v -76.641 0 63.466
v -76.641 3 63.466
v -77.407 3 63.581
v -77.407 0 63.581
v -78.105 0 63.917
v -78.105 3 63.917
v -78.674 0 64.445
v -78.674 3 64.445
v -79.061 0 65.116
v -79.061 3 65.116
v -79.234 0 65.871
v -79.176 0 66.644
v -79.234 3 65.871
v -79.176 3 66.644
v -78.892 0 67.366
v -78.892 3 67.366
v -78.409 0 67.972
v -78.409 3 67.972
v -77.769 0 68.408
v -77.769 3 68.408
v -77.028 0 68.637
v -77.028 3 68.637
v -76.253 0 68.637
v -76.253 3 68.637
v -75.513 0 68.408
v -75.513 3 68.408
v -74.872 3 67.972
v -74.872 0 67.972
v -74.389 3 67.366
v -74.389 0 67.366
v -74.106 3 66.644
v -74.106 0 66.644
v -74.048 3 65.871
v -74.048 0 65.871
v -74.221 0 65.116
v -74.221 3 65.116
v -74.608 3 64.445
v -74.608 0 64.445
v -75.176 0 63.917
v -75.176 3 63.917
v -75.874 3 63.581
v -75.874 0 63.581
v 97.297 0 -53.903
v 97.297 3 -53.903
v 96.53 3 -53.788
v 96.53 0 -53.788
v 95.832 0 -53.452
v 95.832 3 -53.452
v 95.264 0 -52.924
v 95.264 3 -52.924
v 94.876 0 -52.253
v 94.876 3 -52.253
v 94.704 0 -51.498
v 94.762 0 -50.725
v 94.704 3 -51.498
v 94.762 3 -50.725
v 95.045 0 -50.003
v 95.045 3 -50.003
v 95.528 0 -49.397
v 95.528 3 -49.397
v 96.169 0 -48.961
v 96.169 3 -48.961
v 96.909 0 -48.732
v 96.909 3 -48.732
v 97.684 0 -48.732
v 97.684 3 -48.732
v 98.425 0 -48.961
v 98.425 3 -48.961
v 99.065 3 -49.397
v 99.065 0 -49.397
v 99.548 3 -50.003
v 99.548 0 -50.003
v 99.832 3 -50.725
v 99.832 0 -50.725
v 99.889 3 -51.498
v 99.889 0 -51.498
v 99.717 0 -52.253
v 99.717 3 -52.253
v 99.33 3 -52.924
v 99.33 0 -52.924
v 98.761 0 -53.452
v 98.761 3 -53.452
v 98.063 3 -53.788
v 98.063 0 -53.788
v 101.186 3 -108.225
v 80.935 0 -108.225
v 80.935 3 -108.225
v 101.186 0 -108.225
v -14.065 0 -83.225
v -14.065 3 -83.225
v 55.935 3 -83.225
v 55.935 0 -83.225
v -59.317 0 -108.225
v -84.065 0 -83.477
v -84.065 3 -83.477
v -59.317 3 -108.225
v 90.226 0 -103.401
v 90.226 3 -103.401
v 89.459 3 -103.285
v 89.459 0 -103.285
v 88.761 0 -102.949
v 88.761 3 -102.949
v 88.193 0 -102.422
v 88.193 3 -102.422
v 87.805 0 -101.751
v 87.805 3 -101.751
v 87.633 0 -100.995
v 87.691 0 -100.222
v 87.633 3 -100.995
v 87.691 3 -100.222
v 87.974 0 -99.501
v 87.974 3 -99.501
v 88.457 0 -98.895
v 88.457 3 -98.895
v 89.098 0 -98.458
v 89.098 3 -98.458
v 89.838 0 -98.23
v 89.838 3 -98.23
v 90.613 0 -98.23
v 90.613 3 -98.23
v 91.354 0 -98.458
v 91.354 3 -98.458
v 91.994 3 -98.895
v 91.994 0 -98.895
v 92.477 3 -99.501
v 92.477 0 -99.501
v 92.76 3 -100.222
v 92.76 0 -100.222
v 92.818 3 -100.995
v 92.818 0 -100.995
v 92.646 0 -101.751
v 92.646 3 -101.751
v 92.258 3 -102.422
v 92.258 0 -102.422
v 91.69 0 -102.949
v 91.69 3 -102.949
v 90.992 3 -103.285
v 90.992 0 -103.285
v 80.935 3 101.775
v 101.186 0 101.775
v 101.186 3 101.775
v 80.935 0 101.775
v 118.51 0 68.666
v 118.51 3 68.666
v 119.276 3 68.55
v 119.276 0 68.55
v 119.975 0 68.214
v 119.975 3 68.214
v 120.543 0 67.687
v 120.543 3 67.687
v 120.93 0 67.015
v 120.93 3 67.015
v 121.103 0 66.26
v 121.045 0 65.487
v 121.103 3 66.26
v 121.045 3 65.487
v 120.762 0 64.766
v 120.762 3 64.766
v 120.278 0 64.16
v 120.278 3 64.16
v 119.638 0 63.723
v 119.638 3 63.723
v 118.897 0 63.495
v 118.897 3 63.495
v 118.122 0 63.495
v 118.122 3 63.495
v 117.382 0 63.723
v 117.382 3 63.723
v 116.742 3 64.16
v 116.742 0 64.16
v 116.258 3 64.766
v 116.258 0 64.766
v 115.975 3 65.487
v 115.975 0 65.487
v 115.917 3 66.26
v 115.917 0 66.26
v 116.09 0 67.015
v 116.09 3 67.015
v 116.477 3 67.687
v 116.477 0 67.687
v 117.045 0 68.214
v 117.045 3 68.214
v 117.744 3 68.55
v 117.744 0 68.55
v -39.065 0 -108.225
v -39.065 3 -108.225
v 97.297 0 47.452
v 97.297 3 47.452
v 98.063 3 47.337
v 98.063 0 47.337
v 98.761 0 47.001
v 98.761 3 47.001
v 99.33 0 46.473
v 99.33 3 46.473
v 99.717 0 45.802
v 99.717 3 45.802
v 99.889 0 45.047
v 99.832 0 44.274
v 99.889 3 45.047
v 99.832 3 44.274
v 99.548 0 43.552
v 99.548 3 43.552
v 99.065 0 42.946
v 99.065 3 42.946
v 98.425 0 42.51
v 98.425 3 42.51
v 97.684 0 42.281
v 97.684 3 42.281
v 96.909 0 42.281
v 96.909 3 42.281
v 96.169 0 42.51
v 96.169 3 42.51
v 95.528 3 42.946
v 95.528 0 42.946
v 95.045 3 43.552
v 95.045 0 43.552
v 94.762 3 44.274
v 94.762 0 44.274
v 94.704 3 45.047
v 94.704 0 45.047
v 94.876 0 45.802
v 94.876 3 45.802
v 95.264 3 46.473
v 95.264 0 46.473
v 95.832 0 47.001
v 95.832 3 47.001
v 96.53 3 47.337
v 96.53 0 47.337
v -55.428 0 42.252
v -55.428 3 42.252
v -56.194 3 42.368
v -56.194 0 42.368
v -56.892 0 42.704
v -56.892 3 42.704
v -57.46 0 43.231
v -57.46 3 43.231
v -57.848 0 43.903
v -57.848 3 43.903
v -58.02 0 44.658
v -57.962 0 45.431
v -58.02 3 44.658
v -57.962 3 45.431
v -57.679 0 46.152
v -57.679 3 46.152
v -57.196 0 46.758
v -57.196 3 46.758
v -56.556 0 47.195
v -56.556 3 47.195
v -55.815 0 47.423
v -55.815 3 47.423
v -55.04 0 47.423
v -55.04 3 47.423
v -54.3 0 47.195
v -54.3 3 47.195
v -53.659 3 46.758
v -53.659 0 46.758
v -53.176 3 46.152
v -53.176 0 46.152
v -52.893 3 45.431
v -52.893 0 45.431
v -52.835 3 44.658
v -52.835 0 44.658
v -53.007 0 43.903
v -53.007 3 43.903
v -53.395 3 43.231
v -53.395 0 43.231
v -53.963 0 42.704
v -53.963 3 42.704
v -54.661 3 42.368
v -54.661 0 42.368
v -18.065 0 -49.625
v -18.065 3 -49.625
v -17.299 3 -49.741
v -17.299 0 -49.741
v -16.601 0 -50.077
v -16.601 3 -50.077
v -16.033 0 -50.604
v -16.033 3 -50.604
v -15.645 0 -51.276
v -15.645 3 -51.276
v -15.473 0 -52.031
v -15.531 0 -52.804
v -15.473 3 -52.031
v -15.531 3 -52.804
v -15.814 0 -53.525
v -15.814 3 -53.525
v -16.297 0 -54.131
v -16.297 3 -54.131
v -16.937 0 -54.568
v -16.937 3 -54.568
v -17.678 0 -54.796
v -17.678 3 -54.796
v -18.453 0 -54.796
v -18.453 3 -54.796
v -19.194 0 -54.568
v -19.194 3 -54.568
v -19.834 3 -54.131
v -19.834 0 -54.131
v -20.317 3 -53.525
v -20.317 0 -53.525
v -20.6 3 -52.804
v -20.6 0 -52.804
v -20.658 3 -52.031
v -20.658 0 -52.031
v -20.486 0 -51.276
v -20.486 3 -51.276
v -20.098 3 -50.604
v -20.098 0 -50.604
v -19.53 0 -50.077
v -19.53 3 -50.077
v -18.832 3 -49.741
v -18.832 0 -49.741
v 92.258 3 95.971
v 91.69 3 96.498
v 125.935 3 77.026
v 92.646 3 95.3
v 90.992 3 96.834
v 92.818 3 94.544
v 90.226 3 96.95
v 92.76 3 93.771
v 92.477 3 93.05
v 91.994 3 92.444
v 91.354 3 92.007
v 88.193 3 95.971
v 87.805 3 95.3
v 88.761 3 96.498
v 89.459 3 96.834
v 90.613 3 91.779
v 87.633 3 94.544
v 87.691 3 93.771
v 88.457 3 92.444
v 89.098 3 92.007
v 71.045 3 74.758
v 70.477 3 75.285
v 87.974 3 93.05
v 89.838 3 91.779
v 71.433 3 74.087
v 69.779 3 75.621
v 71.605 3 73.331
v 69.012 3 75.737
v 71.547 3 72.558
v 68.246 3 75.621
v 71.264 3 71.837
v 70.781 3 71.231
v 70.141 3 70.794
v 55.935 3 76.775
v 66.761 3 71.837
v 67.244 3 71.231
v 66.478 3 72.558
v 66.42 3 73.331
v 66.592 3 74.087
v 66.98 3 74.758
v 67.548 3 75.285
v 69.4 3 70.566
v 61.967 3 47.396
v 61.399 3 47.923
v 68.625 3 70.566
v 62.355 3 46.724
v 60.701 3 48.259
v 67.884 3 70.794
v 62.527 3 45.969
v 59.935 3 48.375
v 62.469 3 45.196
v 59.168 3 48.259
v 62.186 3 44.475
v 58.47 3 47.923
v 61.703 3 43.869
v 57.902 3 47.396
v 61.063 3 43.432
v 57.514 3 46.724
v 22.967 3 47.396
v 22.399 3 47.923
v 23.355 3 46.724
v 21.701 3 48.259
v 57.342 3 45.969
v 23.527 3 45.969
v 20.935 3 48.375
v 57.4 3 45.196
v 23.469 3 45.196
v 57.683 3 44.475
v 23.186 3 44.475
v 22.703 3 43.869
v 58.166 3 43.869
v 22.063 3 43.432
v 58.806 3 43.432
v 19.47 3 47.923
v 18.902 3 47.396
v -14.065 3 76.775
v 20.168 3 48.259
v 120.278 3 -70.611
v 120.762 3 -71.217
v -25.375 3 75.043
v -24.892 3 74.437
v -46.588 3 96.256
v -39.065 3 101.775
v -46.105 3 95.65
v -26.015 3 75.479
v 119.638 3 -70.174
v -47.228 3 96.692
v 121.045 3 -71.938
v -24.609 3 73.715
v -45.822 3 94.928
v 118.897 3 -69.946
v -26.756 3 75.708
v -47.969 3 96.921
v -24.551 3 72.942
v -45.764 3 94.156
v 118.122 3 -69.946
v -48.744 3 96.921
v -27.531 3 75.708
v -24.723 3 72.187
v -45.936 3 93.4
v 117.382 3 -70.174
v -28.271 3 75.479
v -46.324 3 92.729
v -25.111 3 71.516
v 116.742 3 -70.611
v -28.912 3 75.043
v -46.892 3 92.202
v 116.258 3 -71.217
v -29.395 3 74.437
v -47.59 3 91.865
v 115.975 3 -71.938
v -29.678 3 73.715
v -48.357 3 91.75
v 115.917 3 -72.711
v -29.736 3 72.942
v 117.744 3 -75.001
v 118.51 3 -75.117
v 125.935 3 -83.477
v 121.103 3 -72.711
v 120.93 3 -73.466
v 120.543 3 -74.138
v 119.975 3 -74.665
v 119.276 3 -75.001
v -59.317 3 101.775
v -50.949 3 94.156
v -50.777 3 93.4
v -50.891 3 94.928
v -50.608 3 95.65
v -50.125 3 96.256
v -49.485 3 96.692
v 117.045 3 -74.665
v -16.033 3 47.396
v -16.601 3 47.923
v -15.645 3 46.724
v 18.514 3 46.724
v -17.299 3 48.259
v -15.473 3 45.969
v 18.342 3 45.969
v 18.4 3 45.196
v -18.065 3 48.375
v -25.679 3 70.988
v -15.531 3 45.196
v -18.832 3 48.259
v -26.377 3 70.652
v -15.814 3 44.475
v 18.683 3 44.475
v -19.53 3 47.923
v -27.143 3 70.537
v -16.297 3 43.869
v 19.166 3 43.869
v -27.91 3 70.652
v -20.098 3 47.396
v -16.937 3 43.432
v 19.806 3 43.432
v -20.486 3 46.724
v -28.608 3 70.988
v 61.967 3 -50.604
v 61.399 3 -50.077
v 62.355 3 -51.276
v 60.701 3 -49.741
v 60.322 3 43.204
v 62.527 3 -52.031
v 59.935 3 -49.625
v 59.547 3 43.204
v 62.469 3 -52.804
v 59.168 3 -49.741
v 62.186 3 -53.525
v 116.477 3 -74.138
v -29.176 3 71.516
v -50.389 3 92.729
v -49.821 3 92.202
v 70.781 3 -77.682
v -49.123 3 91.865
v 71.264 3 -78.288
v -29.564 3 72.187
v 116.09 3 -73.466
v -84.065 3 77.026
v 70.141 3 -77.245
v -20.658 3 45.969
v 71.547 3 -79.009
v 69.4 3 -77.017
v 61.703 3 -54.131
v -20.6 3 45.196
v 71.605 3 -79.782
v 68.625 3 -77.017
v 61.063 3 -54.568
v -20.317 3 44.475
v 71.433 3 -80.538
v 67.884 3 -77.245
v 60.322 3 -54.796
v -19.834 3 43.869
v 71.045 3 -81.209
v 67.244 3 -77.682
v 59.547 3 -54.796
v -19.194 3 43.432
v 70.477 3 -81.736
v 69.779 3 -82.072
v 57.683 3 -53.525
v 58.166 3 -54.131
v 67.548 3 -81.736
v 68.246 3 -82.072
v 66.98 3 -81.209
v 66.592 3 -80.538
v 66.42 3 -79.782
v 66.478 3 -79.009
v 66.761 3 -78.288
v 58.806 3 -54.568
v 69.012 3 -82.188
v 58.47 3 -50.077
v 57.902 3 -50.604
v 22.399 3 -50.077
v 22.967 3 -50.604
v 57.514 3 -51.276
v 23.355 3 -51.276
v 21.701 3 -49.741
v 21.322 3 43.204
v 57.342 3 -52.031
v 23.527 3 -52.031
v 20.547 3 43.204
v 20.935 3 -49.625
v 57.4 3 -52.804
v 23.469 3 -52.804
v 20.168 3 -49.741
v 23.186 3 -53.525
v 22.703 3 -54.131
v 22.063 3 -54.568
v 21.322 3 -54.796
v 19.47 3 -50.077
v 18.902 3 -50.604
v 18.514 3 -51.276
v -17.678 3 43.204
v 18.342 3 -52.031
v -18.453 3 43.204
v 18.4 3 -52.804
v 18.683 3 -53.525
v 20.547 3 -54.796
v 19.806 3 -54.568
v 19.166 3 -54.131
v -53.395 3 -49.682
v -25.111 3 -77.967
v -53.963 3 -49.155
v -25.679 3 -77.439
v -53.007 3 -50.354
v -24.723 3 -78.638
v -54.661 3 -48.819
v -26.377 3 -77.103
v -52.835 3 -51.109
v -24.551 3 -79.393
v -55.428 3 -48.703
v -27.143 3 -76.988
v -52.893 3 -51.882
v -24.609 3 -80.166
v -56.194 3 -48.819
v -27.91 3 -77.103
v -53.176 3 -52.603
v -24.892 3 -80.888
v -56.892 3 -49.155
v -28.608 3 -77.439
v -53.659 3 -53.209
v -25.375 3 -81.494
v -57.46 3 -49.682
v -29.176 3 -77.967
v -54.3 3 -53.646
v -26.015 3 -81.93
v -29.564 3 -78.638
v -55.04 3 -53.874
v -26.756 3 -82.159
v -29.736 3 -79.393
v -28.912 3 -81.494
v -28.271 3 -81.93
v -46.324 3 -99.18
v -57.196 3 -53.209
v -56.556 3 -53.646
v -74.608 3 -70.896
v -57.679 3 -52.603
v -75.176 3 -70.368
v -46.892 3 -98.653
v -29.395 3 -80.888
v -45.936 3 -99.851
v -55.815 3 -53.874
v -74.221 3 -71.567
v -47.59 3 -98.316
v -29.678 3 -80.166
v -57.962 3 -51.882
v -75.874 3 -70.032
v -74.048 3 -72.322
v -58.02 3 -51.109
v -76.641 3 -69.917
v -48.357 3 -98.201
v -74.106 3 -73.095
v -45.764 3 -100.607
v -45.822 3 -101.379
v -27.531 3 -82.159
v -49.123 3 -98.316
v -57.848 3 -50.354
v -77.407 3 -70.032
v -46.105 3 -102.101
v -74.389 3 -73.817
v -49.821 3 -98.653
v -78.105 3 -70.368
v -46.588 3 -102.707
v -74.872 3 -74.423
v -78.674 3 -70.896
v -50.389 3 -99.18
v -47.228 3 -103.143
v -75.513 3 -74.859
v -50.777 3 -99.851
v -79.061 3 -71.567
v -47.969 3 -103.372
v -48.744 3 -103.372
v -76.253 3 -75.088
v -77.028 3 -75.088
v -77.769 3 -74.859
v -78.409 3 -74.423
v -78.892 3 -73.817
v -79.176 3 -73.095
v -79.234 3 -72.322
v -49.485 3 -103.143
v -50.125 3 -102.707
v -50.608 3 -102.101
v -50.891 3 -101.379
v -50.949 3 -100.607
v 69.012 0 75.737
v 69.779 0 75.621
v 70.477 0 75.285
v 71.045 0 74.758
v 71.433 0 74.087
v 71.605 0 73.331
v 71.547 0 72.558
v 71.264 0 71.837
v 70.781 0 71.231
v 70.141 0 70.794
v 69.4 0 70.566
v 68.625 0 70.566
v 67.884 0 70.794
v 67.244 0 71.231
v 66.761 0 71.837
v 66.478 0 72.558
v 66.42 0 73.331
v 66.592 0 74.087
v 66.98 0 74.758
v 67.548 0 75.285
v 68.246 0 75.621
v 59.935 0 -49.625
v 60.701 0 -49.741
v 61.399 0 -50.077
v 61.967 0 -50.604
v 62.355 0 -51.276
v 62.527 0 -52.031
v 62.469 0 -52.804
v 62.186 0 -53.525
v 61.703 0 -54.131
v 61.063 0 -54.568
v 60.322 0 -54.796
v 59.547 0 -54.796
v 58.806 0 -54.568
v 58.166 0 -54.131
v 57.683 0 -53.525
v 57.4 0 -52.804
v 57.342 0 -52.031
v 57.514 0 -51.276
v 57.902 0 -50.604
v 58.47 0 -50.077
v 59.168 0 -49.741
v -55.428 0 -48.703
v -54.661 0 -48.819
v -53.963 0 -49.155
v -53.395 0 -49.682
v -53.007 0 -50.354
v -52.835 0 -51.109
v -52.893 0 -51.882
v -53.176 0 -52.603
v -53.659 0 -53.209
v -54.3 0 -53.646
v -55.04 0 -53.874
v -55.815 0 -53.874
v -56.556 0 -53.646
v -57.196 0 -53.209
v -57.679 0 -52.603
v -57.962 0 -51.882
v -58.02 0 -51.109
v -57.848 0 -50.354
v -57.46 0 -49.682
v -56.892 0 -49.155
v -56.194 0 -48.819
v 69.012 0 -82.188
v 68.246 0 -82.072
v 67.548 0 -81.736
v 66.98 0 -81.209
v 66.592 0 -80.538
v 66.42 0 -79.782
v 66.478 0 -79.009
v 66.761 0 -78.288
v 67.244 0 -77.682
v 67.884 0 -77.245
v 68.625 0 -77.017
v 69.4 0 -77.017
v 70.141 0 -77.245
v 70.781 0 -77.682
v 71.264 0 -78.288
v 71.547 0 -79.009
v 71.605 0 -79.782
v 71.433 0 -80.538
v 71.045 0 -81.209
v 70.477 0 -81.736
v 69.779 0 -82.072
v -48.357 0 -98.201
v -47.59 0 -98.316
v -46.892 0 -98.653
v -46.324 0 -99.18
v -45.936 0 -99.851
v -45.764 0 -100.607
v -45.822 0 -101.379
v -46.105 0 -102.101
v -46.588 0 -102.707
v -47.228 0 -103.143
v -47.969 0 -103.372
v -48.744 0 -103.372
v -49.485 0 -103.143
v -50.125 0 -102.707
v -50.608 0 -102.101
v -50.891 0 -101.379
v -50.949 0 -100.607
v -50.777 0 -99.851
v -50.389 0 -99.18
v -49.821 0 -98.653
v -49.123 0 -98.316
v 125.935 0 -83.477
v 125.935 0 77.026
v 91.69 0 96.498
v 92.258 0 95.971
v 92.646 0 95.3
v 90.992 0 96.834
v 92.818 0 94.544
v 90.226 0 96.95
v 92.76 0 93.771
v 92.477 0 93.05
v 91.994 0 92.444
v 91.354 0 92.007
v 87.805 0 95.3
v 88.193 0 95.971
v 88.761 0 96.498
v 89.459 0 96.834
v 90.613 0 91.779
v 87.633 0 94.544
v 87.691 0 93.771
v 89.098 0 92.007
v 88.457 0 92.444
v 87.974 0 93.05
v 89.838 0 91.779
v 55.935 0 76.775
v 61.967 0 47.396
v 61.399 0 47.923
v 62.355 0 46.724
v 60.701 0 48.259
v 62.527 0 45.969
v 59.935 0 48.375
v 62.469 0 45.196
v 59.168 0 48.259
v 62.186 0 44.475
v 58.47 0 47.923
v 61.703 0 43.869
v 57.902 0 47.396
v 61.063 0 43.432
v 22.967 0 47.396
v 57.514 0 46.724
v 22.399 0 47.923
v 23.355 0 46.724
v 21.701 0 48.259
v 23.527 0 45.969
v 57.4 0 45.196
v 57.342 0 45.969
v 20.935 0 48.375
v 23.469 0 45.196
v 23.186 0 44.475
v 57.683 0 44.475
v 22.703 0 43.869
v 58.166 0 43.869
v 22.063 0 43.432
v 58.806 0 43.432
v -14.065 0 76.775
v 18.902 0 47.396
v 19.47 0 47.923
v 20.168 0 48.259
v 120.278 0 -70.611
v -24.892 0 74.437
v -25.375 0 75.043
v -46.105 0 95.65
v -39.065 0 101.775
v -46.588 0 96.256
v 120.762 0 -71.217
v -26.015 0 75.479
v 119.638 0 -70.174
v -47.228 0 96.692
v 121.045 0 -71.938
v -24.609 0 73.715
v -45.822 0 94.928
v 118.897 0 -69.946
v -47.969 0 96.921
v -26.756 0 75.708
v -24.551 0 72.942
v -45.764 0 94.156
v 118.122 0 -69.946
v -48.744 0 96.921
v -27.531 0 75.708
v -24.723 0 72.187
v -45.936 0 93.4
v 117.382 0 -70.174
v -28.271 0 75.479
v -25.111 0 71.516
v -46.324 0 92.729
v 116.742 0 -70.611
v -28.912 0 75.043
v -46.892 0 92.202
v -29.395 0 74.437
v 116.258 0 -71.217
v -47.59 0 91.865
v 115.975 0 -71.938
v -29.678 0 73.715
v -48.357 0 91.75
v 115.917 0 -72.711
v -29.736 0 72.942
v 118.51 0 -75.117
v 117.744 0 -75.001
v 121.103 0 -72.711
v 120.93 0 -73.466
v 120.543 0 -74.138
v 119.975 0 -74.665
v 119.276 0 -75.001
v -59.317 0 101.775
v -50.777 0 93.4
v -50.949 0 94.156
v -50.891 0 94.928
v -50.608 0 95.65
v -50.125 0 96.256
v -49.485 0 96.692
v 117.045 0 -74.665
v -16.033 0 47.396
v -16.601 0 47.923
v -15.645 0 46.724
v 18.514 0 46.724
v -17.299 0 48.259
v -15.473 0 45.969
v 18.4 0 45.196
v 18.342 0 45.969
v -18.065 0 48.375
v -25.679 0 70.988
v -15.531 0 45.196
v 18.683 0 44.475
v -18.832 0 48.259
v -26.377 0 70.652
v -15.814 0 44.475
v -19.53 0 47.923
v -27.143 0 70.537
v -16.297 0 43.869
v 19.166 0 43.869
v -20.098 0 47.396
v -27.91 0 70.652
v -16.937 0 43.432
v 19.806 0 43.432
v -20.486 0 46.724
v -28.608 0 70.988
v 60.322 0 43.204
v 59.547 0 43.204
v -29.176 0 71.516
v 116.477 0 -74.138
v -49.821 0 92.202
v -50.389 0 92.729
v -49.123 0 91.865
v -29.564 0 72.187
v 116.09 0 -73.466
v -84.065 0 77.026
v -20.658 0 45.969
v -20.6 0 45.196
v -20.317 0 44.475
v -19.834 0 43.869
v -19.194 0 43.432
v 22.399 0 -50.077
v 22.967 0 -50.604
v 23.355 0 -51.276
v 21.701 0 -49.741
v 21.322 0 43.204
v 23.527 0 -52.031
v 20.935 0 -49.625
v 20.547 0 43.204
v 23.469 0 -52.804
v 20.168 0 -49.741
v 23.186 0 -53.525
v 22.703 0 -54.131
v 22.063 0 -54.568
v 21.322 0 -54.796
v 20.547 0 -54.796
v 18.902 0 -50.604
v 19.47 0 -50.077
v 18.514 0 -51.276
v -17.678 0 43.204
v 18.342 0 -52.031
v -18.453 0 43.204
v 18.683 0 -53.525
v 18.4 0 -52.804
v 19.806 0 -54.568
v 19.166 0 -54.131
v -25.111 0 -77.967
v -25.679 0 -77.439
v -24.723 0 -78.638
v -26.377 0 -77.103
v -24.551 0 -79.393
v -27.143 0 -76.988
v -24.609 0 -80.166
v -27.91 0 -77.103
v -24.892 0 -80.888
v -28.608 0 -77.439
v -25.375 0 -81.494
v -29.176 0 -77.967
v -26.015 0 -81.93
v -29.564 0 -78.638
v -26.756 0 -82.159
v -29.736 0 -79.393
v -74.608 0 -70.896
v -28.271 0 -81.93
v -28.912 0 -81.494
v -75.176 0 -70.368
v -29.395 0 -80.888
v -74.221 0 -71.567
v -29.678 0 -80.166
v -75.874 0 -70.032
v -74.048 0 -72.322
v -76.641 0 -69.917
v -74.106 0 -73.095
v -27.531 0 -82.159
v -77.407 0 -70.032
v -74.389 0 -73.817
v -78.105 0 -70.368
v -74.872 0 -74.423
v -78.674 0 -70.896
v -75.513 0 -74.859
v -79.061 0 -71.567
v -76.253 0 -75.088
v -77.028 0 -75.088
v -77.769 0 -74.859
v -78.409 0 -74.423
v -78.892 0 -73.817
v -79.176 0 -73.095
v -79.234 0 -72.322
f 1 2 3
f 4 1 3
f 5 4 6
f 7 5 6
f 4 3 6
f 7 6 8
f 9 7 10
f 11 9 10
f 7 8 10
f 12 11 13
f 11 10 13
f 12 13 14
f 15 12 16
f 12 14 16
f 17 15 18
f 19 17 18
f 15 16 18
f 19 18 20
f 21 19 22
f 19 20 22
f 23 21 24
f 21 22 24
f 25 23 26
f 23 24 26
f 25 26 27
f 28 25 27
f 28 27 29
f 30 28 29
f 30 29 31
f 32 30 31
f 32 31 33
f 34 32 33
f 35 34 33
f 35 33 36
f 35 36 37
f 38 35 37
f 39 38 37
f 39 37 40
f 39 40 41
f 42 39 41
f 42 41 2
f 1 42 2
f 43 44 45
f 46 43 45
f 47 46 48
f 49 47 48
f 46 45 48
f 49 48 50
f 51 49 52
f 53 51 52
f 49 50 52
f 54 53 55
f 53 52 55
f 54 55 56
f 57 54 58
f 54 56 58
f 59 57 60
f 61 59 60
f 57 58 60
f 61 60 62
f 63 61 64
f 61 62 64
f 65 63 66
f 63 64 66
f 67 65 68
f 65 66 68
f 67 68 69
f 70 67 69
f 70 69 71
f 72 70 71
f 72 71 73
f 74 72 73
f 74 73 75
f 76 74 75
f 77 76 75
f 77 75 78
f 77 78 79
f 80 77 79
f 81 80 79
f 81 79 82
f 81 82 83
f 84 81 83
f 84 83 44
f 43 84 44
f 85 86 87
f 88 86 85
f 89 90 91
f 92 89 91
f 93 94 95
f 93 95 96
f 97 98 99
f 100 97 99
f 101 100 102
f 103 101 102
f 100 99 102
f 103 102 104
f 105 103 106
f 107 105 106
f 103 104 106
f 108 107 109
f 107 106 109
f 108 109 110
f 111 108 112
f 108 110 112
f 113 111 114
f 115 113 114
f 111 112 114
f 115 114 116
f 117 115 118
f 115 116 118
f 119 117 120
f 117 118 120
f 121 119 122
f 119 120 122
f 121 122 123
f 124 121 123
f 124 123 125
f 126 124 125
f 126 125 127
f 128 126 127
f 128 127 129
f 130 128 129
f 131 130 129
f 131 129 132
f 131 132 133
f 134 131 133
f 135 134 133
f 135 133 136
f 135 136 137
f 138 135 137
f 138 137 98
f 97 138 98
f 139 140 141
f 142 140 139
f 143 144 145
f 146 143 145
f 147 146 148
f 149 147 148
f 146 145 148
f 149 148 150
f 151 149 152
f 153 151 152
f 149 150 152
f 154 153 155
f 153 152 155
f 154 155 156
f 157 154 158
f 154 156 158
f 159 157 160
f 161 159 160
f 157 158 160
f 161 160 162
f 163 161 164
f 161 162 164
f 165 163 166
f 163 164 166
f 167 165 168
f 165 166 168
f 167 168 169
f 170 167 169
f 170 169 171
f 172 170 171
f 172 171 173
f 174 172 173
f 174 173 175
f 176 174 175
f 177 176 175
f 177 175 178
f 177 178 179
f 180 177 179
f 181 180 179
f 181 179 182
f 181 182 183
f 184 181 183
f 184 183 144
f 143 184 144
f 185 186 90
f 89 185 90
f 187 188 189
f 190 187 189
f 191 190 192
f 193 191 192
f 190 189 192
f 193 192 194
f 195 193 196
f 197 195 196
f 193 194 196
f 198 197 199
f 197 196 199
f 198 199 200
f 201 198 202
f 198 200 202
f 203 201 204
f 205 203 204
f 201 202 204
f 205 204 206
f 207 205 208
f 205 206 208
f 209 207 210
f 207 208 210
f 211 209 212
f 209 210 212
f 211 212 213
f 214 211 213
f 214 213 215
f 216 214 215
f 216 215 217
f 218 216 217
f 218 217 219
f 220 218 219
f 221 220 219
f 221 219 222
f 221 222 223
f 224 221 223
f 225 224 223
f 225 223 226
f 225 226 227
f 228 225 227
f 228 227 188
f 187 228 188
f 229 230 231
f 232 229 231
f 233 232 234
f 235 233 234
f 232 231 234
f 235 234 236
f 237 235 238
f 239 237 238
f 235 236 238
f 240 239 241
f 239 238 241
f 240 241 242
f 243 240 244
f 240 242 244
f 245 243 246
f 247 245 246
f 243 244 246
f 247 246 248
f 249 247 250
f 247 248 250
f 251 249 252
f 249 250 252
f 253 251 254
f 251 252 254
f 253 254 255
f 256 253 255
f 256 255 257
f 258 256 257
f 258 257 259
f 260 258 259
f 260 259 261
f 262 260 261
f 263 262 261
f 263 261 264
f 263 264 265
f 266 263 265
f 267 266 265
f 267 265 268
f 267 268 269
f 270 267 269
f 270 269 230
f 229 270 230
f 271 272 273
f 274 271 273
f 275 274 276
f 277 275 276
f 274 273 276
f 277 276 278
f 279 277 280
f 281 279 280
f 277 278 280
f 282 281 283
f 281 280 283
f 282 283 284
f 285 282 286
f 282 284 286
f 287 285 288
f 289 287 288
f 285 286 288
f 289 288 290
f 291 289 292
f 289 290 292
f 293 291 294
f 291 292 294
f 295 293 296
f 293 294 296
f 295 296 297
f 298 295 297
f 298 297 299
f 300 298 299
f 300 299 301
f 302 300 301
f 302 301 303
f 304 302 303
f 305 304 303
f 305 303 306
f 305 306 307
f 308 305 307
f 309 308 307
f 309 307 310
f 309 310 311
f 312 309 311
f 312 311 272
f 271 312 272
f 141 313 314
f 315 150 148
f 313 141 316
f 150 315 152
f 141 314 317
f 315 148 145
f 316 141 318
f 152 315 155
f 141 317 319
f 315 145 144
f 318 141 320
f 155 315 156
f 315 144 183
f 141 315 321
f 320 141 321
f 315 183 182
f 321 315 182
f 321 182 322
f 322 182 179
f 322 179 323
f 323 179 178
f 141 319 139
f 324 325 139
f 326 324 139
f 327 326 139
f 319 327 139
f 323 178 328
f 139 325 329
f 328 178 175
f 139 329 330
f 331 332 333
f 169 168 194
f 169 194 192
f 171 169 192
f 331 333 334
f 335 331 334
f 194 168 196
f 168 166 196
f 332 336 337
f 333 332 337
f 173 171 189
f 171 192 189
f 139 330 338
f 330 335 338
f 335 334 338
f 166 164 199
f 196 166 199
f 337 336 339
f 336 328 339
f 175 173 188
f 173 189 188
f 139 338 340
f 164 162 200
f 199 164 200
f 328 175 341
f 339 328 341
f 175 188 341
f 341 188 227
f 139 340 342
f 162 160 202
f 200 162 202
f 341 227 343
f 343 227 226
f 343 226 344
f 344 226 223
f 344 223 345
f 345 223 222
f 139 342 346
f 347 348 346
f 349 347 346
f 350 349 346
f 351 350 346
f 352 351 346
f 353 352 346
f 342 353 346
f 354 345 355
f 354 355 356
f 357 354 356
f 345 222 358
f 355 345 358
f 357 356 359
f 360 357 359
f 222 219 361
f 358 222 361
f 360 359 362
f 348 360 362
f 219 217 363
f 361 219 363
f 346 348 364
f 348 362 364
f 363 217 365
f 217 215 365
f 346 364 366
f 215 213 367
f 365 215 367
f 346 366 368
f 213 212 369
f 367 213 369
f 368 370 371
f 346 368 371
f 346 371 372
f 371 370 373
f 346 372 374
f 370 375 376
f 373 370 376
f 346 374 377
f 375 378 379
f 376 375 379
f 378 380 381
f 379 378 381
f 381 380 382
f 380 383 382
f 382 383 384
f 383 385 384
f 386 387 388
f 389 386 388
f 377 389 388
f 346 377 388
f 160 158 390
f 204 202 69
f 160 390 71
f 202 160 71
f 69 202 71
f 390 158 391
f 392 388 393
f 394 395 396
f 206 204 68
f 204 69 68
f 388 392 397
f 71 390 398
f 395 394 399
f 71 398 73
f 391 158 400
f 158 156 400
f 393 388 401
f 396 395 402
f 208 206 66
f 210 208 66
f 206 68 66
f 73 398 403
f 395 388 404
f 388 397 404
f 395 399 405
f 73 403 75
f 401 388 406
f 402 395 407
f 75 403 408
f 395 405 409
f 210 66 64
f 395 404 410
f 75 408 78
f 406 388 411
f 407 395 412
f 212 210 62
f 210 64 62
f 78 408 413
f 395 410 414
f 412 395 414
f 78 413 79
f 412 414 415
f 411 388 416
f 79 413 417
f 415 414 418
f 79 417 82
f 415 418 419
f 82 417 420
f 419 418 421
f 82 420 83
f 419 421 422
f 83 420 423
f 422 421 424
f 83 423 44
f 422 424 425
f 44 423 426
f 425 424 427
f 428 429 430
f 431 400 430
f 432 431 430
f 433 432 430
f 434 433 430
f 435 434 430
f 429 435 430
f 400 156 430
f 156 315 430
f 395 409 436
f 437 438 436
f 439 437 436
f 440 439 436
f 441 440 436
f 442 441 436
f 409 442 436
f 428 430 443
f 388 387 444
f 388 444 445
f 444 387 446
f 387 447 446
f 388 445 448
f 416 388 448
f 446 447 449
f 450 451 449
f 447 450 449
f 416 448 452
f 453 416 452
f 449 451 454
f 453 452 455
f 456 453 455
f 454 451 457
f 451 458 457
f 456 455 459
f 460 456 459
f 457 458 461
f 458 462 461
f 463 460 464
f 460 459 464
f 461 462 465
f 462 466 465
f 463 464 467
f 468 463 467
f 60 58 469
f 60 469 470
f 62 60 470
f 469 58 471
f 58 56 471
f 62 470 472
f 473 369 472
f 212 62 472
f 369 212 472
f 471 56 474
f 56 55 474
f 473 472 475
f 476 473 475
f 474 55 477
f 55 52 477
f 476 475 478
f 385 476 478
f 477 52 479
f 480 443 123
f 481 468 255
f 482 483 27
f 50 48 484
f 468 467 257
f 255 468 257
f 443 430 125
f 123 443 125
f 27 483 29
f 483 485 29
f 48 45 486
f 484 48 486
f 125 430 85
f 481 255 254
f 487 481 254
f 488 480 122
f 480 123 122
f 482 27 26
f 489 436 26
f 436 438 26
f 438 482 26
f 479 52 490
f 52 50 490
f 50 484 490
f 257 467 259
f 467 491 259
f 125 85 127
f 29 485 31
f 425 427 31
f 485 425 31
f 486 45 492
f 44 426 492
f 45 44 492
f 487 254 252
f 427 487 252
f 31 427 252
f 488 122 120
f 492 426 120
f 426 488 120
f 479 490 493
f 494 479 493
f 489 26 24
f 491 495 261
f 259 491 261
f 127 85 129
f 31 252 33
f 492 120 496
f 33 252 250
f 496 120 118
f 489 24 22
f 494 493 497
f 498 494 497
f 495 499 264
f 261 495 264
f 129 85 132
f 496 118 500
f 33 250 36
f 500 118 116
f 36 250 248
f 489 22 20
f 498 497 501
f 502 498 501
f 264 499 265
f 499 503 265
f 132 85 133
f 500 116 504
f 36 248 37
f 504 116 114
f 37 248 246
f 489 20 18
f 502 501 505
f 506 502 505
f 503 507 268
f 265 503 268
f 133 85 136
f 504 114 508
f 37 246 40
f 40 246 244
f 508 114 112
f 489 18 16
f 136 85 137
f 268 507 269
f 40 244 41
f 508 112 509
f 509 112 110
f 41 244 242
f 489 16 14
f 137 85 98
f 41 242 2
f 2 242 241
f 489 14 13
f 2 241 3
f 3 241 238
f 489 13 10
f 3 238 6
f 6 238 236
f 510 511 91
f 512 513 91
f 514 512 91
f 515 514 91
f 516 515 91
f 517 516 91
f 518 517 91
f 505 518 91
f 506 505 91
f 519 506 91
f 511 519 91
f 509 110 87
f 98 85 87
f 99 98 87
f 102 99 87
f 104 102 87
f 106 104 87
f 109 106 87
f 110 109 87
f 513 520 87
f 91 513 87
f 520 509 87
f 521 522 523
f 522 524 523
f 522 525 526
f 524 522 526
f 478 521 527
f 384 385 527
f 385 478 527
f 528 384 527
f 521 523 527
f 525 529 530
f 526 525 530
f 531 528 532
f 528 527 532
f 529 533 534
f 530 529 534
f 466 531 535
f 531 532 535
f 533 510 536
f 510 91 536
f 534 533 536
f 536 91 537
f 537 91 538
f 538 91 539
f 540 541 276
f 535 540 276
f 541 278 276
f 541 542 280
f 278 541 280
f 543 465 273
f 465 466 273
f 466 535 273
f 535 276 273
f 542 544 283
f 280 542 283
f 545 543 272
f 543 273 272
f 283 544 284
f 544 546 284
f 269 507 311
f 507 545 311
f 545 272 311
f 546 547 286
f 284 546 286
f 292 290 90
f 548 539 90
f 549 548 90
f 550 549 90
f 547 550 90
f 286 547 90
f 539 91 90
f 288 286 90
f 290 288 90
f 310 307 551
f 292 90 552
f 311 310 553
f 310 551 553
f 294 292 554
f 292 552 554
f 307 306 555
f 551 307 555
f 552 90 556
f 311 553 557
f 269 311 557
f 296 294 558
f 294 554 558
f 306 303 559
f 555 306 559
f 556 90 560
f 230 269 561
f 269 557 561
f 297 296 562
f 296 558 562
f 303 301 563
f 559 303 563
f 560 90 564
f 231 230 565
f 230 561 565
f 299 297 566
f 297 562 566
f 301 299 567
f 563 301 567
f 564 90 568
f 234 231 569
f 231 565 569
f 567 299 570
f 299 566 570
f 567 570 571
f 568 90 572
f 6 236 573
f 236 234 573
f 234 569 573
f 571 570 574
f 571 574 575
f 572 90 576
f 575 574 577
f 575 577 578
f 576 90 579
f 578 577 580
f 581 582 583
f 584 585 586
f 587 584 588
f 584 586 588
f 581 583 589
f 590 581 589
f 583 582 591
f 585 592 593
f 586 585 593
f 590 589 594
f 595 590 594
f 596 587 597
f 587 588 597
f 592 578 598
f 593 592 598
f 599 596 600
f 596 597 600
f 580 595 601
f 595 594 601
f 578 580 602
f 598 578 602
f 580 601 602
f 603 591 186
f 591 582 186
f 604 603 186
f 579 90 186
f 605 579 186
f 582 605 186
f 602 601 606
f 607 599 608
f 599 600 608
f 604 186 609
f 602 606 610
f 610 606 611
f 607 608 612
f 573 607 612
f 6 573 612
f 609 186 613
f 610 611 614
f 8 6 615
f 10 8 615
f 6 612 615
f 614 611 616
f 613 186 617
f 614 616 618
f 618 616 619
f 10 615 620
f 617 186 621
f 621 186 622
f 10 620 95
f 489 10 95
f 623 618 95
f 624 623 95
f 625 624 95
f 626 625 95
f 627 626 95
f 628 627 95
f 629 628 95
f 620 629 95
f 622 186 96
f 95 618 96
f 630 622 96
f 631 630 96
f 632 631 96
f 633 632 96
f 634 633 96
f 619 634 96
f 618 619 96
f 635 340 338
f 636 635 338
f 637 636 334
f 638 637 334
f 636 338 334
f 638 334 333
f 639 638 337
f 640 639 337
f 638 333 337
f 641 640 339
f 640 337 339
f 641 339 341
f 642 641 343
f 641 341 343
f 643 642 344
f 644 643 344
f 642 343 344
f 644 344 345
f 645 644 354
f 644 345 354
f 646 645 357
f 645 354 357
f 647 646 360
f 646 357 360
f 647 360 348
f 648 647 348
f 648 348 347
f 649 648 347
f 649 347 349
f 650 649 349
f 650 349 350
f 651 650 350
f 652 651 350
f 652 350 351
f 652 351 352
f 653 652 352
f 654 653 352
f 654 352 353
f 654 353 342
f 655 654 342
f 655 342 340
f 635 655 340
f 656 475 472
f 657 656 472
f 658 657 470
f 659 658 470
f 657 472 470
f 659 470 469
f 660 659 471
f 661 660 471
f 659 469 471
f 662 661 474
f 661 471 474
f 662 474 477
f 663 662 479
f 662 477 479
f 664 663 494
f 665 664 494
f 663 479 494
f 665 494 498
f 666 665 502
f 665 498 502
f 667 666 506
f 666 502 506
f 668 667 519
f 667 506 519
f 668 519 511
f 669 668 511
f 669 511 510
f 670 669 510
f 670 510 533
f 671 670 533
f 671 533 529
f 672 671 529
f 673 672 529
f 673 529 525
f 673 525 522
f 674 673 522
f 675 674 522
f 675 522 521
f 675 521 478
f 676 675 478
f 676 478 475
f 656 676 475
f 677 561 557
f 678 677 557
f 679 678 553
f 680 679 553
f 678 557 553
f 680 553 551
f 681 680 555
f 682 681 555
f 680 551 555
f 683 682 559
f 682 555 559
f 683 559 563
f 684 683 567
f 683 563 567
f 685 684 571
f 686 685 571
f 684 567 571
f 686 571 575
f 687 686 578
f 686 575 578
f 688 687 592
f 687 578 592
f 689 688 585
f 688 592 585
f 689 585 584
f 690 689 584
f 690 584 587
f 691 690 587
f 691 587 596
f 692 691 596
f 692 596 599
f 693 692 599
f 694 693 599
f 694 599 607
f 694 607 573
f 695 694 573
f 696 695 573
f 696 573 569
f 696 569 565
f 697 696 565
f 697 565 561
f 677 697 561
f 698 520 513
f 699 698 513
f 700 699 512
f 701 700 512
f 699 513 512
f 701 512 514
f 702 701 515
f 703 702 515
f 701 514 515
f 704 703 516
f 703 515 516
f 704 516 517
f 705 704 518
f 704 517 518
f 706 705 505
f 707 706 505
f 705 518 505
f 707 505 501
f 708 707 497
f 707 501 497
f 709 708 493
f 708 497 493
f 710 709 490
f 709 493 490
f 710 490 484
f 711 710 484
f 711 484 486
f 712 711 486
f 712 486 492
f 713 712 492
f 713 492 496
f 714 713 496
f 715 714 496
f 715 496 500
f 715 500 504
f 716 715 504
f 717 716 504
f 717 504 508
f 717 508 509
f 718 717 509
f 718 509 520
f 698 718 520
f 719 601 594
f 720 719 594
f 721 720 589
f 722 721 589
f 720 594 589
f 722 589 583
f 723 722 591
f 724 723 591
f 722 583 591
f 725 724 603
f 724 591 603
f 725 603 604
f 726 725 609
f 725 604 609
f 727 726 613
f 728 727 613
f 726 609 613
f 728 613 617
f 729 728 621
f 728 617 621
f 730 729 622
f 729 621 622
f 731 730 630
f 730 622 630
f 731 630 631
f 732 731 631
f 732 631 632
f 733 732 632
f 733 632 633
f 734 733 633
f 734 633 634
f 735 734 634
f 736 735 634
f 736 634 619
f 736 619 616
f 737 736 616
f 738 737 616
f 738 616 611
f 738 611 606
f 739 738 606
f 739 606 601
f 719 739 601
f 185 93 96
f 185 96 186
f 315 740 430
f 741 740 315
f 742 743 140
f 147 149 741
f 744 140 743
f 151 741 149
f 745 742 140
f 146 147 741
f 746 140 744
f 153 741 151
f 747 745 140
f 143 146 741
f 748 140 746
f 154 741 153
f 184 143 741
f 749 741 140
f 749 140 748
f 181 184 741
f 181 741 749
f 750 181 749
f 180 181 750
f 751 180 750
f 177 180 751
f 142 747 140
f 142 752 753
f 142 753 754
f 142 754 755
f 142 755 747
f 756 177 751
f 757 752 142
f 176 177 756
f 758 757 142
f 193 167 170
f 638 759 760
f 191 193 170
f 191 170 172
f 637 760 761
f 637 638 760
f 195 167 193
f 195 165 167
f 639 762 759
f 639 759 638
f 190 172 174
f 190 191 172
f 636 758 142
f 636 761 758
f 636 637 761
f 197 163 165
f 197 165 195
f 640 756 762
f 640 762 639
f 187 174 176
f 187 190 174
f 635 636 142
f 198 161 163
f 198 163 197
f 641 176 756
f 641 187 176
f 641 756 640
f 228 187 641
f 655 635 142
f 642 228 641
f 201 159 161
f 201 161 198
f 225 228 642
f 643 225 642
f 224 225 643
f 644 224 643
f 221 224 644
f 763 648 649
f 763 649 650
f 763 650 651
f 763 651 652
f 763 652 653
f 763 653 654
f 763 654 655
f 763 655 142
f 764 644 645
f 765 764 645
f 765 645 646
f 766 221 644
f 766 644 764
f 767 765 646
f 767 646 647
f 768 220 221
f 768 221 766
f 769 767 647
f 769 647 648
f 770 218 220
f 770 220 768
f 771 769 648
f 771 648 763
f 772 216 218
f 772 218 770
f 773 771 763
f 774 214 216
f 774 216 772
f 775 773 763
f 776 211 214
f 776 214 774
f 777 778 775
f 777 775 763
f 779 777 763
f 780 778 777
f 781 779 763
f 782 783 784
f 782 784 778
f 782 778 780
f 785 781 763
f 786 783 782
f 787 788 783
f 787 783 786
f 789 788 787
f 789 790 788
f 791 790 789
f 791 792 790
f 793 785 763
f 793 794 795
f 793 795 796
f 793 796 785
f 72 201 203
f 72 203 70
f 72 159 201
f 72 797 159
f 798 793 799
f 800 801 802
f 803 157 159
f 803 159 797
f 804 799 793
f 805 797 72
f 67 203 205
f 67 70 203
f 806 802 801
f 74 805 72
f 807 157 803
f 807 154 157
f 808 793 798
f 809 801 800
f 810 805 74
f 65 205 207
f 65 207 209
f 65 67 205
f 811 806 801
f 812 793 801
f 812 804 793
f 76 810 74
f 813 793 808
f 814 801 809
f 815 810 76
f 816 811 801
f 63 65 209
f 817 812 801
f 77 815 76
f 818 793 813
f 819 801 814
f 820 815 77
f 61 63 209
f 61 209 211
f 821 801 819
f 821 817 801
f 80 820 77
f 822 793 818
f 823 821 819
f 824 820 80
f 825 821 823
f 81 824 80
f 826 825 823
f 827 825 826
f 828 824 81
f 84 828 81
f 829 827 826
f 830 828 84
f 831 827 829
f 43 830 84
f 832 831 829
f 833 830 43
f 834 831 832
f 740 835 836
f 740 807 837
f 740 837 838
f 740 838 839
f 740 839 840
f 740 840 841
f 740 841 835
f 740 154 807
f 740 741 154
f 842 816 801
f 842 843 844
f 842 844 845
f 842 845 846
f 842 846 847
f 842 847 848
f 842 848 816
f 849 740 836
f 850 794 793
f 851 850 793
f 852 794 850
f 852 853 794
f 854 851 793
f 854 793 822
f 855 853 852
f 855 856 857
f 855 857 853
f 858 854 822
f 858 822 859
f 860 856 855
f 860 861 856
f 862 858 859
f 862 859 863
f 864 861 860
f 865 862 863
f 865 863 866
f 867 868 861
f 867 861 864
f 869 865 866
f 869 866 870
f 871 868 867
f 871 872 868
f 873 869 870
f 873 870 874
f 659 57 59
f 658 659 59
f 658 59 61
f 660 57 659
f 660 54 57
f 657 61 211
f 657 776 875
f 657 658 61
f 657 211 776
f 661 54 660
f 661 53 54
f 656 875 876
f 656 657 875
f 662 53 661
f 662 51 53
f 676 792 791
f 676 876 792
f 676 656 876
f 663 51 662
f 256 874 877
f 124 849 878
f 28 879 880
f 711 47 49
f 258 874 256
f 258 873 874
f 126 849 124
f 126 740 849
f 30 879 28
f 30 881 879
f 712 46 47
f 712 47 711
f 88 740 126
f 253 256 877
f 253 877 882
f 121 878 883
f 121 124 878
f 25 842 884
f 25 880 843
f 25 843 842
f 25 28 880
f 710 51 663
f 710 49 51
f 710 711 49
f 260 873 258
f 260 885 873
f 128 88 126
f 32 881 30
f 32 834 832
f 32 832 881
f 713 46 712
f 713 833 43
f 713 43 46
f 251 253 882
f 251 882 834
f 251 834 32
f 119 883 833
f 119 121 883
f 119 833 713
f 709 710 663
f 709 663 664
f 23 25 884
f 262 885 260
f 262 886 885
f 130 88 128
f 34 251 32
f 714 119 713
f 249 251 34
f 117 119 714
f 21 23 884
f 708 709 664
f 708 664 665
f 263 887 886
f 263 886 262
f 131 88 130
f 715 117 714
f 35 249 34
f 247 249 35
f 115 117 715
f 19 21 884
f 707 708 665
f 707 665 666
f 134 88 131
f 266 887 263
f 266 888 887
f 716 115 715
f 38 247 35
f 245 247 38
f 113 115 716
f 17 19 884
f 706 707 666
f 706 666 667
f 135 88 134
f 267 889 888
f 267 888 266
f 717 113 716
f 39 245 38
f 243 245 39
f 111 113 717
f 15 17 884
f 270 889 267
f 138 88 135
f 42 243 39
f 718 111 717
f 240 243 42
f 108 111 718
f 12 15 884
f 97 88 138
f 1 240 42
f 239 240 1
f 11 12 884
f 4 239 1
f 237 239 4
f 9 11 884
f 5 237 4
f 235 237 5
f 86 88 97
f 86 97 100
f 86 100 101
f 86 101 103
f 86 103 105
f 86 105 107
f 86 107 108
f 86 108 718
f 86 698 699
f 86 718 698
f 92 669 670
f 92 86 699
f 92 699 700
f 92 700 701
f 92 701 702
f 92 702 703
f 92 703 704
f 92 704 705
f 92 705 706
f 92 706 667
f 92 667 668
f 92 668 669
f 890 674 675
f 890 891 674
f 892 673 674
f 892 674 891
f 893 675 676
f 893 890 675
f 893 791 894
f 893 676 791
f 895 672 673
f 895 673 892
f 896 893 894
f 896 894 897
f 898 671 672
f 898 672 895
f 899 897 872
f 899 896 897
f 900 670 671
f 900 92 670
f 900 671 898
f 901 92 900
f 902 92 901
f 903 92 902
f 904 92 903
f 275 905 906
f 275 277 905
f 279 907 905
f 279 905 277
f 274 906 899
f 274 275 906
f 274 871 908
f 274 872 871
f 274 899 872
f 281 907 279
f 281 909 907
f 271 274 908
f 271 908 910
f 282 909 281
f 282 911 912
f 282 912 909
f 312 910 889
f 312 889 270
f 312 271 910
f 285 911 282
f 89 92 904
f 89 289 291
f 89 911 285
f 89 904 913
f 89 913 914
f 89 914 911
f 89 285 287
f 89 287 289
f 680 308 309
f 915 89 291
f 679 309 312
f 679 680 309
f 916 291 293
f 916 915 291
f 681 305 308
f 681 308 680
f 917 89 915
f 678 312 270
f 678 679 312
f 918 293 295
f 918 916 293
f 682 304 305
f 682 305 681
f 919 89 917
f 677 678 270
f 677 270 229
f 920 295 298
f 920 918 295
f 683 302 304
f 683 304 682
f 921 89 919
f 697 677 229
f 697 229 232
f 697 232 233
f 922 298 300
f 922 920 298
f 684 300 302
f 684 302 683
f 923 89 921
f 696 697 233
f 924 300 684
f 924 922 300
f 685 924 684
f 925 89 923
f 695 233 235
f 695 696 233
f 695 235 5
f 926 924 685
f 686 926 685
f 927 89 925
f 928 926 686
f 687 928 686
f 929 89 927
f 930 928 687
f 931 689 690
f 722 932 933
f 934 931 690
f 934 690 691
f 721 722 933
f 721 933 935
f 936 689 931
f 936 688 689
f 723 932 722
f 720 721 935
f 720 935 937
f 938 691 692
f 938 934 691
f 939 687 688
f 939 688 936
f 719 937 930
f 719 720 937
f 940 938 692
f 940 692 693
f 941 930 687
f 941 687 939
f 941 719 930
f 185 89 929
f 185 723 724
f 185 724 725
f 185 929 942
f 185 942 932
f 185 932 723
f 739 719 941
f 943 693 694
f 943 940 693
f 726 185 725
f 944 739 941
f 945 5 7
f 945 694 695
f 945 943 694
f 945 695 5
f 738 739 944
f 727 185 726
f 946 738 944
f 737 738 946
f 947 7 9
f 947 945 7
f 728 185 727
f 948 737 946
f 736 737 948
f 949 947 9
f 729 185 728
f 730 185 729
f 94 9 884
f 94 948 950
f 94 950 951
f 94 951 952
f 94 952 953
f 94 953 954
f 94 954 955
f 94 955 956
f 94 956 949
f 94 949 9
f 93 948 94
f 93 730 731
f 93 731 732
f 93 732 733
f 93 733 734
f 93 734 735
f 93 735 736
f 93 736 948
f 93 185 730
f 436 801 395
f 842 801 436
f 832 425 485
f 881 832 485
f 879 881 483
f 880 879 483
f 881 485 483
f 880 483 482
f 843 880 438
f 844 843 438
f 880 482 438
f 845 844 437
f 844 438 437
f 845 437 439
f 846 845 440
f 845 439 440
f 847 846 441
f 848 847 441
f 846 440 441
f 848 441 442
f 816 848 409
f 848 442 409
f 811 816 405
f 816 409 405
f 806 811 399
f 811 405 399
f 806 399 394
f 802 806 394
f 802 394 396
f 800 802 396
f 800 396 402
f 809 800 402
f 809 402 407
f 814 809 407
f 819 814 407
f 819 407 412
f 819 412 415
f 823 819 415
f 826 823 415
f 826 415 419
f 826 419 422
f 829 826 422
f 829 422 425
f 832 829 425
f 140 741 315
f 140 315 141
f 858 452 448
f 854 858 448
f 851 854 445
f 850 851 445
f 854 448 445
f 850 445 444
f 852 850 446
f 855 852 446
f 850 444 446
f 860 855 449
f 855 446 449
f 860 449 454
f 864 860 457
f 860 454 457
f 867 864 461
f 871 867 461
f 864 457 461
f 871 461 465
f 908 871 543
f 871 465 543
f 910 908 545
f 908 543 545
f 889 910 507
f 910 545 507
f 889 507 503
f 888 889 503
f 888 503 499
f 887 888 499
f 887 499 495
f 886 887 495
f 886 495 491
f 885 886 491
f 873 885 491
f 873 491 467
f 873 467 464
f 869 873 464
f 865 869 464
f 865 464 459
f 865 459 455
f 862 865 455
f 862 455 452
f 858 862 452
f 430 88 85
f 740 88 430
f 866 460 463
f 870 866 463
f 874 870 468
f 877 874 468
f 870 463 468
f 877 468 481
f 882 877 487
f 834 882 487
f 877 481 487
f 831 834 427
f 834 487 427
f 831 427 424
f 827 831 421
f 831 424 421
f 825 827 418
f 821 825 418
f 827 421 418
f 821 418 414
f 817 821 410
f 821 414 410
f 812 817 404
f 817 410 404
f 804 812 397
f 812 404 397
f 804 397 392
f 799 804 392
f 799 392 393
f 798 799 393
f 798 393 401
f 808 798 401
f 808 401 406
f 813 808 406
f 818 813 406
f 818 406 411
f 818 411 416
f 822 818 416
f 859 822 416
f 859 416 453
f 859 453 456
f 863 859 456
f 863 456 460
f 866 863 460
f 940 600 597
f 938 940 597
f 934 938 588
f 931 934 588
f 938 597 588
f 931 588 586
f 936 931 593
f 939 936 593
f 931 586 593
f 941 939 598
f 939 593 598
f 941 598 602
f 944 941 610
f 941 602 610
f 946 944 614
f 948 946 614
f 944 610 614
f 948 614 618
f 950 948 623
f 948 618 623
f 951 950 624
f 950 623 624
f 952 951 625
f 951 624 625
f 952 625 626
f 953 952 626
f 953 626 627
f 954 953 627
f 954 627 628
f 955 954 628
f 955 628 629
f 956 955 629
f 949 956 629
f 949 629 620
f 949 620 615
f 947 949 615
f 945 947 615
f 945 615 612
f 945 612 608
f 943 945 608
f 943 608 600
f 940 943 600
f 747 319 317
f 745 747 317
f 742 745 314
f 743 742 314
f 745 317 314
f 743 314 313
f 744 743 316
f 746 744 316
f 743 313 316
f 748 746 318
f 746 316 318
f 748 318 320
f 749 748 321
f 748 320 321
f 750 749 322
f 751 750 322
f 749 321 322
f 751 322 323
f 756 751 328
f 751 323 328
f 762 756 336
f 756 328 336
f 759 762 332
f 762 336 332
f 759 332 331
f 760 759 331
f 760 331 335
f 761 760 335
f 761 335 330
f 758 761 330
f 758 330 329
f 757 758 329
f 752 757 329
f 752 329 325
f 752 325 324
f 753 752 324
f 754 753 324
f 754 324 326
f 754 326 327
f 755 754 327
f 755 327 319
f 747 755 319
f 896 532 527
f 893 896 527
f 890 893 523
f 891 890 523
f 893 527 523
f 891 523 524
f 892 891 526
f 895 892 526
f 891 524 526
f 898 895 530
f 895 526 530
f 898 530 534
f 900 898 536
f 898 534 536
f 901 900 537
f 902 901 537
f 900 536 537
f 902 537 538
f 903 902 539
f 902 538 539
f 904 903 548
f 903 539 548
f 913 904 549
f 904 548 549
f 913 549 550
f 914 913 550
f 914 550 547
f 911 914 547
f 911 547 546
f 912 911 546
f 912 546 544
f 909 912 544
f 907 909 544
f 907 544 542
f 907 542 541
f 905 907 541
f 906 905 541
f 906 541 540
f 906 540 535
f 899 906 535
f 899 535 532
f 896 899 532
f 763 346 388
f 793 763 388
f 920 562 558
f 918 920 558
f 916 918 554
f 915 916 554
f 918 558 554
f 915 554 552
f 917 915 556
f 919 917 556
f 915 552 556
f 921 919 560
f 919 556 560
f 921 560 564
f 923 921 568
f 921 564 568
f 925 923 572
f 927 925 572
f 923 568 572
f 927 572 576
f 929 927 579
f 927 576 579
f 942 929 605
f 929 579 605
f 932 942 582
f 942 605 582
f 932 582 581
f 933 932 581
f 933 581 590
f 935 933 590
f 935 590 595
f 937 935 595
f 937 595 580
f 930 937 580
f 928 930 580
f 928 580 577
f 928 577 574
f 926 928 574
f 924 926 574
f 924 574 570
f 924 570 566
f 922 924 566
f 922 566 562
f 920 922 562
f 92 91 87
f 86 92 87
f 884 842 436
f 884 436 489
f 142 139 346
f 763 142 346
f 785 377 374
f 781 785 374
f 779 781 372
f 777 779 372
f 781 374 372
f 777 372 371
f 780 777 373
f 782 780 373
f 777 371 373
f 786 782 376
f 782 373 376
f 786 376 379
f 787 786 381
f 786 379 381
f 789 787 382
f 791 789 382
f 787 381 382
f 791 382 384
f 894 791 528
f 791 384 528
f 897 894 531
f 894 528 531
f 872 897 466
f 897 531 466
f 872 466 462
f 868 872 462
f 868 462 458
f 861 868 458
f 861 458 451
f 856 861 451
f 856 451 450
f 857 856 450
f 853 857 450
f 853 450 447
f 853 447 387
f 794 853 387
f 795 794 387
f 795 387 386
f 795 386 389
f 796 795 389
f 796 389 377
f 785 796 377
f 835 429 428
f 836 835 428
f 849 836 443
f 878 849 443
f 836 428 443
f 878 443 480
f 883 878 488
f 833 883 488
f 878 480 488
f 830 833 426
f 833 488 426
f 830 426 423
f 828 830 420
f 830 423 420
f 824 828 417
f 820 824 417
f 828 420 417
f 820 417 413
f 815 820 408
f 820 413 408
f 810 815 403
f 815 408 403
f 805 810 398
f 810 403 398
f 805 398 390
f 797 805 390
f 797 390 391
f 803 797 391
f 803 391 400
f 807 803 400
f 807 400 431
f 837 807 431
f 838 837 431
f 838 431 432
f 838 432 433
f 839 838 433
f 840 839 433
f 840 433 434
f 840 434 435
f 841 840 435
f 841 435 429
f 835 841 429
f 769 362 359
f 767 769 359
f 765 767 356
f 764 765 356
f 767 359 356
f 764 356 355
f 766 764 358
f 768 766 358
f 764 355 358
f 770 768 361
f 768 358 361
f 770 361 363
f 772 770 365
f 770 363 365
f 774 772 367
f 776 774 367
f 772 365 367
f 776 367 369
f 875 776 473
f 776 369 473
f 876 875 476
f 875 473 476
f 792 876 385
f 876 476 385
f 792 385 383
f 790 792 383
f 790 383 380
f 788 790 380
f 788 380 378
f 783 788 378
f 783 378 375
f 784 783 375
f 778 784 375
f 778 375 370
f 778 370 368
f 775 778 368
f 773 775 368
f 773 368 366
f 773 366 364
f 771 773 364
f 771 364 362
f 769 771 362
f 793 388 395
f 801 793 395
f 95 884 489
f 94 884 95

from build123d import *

# Parameters (mm, degrees)
BOSS_EXTRUDE1_DEPTH = 3
BOSS_EXTRUDE2_DEPTH = 2
SKETCH6_R           = 2.6
CUT_EXTRUDE6_DEPTH  = 167.076115532
SKETCH3_R           = 2.6
CUT_EXTRUDE7_DEPTH  = 167.076115532
CUT_EXTRUDE8_DEPTH  = 167.076115532


with BuildPart() as part:
    # Sketch1 → Boss-Extrude1 (new body)
    with BuildSketch(Plane(origin=(0, 0, 0), x_dir=(1, 0, 0), z_dir=(0, 1, 0))):
        Polygon((-59.316686906, 108.225499677), (101.185838411, 108.225499677), (125.934575753, 83.476762335), (125.934575753, -77.025762982), (101.185838411, -101.774500323), (-59.316686906, -101.774500323), (-84.065424247, -77.025762982), (-84.065424247, 83.476762335), align=None)
    extrude(amount=BOSS_EXTRUDE1_DEPTH)

    # Sketch2 → Boss-Extrude2 (add)
    with BuildSketch(Plane(origin=(0, 3, 0), x_dir=(1, 0, 0), z_dir=(0, 1, 0))):
        Polygon((-84.065424247, -77.025762982), (-45.174551282, -38.134890016), (-20.425813941, -62.883627358), (-59.316686906, -101.774500323), align=None)
        Polygon((125.934575753, -77.025762982), (93.880849872, -37.104770943), (66.751068905, -58.888061335), (101.185838411, -101.774500323), align=None)
        Polygon((101.185838411, 108.225499677), (62.16108336, 69.955487183), (86.665825958, 44.96747398), (125.934575753, 83.476762335), align=None)
        Polygon((-59.316686906, 108.225499677), (-24.100270952, 65.978558399), (-50.874640527, 43.659845911), (-84.065424247, 83.476762335), align=None)
    extrude(amount=-BOSS_EXTRUDE2_DEPTH)

    # Sketch6 → Cut-Extrude6 (cut, through all)
    with BuildSketch(Plane(origin=(0, 3, 0), x_dir=(1, 0, 0), z_dir=(0, 1, 0))):
        with Locations((-18.065424247, -45.774500323)):
            Circle(SKETCH6_R)
        with Locations((20.934575753, -45.774500323)):
            Circle(SKETCH6_R)
        with Locations((-18.065424247, 52.225499677)):
            Circle(SKETCH6_R)
        with Locations((59.934575753, -45.774500323)):
            Circle(SKETCH6_R)
        with Locations((20.934575753, 52.225499677)):
            Circle(SKETCH6_R)
        with Locations((59.934575753, 52.225499677)):
            Circle(SKETCH6_R)
    extrude(amount=-CUT_EXTRUDE6_DEPTH, mode=Mode.SUBTRACT)

    # Sketch3 → Cut-Extrude7 (cut, through all)
    with BuildSketch(Plane(origin=(0, 3, 0), x_dir=(1, 0, 0), z_dir=(0, 1, 0))):
        with Locations((-27.143328362, 79.587675039)):
            Circle(SKETCH3_R)
        with Locations((-55.427599609, 51.303403791)):
            Circle(SKETCH3_R)
        with Locations((-76.640803045, 72.516607227)):
            Circle(SKETCH3_R)
        with Locations((-48.356531798, 100.800878474)):
            Circle(SKETCH3_R)
        with Locations((118.50995455, 72.516607227)):
            Circle(SKETCH3_R)
        with Locations((97.296751114, 51.303403791)):
            Circle(SKETCH3_R)
        with Locations((69.012479867, 79.587675039)):
            Circle(SKETCH3_R)
        with Locations((90.225683303, 100.800878474)):
            Circle(SKETCH3_R)
        with Locations((-55.427599609, -44.852404438)):
            Circle(SKETCH3_R)
        with Locations((-76.640803045, -66.065607873)):
            Circle(SKETCH3_R)
        with Locations((-48.356531798, -94.349879121)):
            Circle(SKETCH3_R)
        with Locations((-27.143328362, -73.136675685)):
            Circle(SKETCH3_R)
        with Locations((118.50995455, -66.065607873)):
            Circle(SKETCH3_R)
        with Locations((97.296751114, -44.852404438)):
            Circle(SKETCH3_R)
        with Locations((90.225683303, -94.349879121)):
            Circle(SKETCH3_R)
        with Locations((69.012479867, -73.136675685)):
            Circle(SKETCH3_R)
    extrude(amount=-CUT_EXTRUDE7_DEPTH, mode=Mode.SUBTRACT)

    # Sketch7 → Cut-Extrude8 (cut, through all)
    with BuildSketch(Plane(origin=(0, 3, 0), x_dir=(1, 0, 0), z_dir=(0, 1, 0))):
        Polygon((-14.065424247, 83.225499677), (55.934575753, 83.225499677), (80.934575753, 108.225499677), (-39.065424247, 108.225499677), align=None)
        Polygon((-14.065424247, -76.774500323), (-39.065424247, -101.774500323), (80.934575753, -101.774500323), (55.934575753, -76.774500323), align=None)
    extrude(amount=-CUT_EXTRUDE8_DEPTH, mode=Mode.SUBTRACT)


solid = part.part
